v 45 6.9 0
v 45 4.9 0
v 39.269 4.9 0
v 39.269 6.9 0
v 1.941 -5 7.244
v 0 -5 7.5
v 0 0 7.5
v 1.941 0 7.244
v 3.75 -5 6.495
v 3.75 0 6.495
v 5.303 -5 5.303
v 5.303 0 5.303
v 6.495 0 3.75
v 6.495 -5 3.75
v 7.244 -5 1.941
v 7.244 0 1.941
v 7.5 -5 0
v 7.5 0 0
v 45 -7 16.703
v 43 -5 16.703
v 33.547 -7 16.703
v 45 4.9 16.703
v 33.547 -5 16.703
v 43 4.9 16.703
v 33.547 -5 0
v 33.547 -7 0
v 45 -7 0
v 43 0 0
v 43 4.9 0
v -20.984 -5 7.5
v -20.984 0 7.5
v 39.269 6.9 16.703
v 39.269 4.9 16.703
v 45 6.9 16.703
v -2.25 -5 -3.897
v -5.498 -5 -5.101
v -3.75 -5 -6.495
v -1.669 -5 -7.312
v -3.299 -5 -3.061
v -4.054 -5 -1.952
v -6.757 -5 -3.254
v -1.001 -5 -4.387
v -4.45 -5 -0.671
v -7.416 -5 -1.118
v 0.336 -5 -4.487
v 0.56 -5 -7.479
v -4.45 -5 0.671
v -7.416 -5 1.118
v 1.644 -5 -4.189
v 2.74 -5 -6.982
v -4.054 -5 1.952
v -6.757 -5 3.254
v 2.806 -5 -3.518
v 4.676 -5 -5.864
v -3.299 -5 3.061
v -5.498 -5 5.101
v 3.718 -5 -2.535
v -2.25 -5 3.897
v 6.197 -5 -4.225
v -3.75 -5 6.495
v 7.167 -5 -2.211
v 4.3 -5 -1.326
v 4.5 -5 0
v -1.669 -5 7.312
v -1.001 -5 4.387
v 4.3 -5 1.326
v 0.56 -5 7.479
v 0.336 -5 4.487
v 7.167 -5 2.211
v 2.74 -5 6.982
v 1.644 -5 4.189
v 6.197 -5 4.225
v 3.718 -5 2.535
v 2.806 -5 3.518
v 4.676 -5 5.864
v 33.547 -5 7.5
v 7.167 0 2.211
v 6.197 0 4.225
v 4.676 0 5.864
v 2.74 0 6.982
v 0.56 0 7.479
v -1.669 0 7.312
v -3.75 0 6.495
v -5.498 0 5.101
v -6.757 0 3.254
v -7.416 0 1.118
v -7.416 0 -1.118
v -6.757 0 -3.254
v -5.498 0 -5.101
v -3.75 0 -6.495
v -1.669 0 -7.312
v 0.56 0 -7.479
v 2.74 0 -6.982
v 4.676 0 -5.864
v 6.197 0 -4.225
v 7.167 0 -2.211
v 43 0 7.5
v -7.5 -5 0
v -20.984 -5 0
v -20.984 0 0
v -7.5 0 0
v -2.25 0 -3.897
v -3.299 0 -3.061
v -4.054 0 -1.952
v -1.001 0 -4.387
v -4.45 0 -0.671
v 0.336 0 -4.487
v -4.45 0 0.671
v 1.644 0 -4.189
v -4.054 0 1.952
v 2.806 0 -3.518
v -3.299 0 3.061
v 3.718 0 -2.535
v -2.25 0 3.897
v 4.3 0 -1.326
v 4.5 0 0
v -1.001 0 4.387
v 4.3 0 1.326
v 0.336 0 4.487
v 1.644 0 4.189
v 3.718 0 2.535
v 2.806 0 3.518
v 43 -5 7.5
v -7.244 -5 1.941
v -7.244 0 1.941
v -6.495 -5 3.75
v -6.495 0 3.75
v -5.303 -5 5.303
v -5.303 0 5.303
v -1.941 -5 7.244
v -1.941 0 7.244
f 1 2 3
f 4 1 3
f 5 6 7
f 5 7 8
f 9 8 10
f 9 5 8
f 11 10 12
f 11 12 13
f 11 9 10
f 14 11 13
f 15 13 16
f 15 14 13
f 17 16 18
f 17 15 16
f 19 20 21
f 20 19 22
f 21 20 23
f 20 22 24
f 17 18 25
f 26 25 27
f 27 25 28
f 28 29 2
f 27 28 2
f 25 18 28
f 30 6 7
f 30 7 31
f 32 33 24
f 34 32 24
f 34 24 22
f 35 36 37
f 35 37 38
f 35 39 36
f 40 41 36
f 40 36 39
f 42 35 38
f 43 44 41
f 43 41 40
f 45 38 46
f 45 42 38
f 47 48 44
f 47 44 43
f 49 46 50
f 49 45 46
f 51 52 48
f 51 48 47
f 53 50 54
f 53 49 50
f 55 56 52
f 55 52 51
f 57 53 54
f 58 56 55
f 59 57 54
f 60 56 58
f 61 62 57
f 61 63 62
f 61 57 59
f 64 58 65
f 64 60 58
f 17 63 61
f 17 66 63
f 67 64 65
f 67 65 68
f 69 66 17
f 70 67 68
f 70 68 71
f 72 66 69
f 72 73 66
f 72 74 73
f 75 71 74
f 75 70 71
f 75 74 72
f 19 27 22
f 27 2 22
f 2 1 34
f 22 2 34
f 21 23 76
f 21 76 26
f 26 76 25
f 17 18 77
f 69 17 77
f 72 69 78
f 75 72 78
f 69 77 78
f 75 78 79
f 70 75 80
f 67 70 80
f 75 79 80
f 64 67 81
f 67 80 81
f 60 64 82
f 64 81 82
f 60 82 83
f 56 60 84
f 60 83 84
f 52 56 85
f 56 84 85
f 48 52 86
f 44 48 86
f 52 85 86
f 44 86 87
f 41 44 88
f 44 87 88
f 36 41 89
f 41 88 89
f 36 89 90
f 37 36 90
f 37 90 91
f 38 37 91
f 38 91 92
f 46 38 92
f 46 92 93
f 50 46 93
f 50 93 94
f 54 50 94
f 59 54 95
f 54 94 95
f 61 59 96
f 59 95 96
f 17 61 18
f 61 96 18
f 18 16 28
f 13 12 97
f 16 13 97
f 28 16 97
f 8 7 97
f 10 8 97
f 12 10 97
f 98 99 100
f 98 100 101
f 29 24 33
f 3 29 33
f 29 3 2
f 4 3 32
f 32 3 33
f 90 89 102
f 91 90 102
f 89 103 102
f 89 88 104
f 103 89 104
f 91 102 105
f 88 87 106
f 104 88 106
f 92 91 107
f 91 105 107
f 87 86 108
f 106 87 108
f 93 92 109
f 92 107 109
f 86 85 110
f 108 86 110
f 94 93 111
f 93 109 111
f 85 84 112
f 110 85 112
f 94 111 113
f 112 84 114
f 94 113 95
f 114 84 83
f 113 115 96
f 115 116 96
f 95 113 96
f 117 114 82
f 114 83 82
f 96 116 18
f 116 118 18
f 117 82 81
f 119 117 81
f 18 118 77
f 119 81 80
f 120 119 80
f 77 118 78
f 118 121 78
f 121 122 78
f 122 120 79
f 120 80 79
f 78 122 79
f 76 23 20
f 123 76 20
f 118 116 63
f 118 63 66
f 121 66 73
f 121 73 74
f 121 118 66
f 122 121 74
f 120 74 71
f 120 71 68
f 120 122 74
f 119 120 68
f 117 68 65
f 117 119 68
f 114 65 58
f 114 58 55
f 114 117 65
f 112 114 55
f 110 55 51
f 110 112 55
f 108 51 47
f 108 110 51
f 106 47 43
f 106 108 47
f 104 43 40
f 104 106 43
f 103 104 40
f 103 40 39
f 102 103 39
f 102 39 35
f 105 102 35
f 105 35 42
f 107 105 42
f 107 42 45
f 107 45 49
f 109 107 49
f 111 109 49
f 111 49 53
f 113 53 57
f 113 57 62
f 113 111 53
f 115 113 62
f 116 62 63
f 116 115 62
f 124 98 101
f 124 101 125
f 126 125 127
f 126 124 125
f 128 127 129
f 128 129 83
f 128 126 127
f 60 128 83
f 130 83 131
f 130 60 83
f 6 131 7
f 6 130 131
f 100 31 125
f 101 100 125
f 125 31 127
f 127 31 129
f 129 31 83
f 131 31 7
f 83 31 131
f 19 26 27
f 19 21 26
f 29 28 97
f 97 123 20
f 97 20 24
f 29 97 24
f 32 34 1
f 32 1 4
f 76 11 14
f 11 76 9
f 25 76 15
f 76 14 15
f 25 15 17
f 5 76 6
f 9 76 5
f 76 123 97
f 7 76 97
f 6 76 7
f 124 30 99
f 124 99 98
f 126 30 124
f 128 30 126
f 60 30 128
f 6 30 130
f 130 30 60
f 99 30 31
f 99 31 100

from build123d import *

# Parameters (mm, degrees)
F0_R     = 7.5
F0_R_2   = 4.5
F1_DEPTH = 5
F3_DEPTH = 5
F4_W     = 5
F4_H     = 7.5
F5_DEPTH = 2
F6_W     = 3.731436
F6_H     = 16.702701
F6_W_2   = 2
F7_DEPTH = 2
F9_DEPTH = 2


with BuildPart() as f1:
    # F0 (on Front) → F1 (new body)
    with BuildSketch(Plane.XZ):
        Circle(F0_R)
        Circle(F0_R_2, mode=Mode.SUBTRACT)
    extrude(amount=F1_DEPTH)


with BuildPart() as f3:
    # F2 (on face) → F3 (new body)
    with BuildSketch(Plane.XZ.offset(5)):
        with BuildLine():
            ThreePointArc((-7.5, 0), (-5.303301, 5.303301), (0, 7.5))
            Line((0, 7.5), (-20.984, 7.5))
            Line((-20.984, 7.5), (-20.984, 0))
            Line((-20.984, 0), (-7.5, 0))
        make_face()
        with BuildLine():
            ThreePointArc((0, 7.5), (5.303301, 5.303301), (7.5, 0))
            Line((7.5, 0), (43, 0))
            Line((43, 0), (43, 7.5))
            Line((43, 7.5), (0, 7.5))
        make_face()
    extrude(amount=-F3_DEPTH)

    # F4 (on face) → F5 (join)
    with BuildSketch(Plane.YZ.offset(43)):
        Polygon((0, 7.5), (0, 0), (4.9, 0), (4.9, 16.702701), (-5, 16.702701), (-5, 7.5), align=None)
        with Locations((-2.5, 3.75)):
            Rectangle(F4_W, F4_H)
    extrude(amount=F5_DEPTH)

    # F6 (on face) → F7 (join)
    with BuildSketch(Plane(origin=(0, 4.9, 0), x_dir=(-1, 0, 0), z_dir=(0, 1, 0))):
        with Locations((-41.134282, 8.35135)):
            Rectangle(F6_W, F6_H)
        with Locations((-44, 8.35135)):
            Rectangle(F6_W_2, F6_H)
    extrude(amount=F7_DEPTH)

    # F8 (on face) → F9 (join)
    with BuildSketch(Plane.XZ.offset(5)):
        Polygon((33.546664, 0), (45, 0), (45, 16.702701), (43, 16.702701), (33.546664, 16.702701), align=None)
    extrude(amount=F9_DEPTH)


solid = Compound([f1.part, f3.part])
